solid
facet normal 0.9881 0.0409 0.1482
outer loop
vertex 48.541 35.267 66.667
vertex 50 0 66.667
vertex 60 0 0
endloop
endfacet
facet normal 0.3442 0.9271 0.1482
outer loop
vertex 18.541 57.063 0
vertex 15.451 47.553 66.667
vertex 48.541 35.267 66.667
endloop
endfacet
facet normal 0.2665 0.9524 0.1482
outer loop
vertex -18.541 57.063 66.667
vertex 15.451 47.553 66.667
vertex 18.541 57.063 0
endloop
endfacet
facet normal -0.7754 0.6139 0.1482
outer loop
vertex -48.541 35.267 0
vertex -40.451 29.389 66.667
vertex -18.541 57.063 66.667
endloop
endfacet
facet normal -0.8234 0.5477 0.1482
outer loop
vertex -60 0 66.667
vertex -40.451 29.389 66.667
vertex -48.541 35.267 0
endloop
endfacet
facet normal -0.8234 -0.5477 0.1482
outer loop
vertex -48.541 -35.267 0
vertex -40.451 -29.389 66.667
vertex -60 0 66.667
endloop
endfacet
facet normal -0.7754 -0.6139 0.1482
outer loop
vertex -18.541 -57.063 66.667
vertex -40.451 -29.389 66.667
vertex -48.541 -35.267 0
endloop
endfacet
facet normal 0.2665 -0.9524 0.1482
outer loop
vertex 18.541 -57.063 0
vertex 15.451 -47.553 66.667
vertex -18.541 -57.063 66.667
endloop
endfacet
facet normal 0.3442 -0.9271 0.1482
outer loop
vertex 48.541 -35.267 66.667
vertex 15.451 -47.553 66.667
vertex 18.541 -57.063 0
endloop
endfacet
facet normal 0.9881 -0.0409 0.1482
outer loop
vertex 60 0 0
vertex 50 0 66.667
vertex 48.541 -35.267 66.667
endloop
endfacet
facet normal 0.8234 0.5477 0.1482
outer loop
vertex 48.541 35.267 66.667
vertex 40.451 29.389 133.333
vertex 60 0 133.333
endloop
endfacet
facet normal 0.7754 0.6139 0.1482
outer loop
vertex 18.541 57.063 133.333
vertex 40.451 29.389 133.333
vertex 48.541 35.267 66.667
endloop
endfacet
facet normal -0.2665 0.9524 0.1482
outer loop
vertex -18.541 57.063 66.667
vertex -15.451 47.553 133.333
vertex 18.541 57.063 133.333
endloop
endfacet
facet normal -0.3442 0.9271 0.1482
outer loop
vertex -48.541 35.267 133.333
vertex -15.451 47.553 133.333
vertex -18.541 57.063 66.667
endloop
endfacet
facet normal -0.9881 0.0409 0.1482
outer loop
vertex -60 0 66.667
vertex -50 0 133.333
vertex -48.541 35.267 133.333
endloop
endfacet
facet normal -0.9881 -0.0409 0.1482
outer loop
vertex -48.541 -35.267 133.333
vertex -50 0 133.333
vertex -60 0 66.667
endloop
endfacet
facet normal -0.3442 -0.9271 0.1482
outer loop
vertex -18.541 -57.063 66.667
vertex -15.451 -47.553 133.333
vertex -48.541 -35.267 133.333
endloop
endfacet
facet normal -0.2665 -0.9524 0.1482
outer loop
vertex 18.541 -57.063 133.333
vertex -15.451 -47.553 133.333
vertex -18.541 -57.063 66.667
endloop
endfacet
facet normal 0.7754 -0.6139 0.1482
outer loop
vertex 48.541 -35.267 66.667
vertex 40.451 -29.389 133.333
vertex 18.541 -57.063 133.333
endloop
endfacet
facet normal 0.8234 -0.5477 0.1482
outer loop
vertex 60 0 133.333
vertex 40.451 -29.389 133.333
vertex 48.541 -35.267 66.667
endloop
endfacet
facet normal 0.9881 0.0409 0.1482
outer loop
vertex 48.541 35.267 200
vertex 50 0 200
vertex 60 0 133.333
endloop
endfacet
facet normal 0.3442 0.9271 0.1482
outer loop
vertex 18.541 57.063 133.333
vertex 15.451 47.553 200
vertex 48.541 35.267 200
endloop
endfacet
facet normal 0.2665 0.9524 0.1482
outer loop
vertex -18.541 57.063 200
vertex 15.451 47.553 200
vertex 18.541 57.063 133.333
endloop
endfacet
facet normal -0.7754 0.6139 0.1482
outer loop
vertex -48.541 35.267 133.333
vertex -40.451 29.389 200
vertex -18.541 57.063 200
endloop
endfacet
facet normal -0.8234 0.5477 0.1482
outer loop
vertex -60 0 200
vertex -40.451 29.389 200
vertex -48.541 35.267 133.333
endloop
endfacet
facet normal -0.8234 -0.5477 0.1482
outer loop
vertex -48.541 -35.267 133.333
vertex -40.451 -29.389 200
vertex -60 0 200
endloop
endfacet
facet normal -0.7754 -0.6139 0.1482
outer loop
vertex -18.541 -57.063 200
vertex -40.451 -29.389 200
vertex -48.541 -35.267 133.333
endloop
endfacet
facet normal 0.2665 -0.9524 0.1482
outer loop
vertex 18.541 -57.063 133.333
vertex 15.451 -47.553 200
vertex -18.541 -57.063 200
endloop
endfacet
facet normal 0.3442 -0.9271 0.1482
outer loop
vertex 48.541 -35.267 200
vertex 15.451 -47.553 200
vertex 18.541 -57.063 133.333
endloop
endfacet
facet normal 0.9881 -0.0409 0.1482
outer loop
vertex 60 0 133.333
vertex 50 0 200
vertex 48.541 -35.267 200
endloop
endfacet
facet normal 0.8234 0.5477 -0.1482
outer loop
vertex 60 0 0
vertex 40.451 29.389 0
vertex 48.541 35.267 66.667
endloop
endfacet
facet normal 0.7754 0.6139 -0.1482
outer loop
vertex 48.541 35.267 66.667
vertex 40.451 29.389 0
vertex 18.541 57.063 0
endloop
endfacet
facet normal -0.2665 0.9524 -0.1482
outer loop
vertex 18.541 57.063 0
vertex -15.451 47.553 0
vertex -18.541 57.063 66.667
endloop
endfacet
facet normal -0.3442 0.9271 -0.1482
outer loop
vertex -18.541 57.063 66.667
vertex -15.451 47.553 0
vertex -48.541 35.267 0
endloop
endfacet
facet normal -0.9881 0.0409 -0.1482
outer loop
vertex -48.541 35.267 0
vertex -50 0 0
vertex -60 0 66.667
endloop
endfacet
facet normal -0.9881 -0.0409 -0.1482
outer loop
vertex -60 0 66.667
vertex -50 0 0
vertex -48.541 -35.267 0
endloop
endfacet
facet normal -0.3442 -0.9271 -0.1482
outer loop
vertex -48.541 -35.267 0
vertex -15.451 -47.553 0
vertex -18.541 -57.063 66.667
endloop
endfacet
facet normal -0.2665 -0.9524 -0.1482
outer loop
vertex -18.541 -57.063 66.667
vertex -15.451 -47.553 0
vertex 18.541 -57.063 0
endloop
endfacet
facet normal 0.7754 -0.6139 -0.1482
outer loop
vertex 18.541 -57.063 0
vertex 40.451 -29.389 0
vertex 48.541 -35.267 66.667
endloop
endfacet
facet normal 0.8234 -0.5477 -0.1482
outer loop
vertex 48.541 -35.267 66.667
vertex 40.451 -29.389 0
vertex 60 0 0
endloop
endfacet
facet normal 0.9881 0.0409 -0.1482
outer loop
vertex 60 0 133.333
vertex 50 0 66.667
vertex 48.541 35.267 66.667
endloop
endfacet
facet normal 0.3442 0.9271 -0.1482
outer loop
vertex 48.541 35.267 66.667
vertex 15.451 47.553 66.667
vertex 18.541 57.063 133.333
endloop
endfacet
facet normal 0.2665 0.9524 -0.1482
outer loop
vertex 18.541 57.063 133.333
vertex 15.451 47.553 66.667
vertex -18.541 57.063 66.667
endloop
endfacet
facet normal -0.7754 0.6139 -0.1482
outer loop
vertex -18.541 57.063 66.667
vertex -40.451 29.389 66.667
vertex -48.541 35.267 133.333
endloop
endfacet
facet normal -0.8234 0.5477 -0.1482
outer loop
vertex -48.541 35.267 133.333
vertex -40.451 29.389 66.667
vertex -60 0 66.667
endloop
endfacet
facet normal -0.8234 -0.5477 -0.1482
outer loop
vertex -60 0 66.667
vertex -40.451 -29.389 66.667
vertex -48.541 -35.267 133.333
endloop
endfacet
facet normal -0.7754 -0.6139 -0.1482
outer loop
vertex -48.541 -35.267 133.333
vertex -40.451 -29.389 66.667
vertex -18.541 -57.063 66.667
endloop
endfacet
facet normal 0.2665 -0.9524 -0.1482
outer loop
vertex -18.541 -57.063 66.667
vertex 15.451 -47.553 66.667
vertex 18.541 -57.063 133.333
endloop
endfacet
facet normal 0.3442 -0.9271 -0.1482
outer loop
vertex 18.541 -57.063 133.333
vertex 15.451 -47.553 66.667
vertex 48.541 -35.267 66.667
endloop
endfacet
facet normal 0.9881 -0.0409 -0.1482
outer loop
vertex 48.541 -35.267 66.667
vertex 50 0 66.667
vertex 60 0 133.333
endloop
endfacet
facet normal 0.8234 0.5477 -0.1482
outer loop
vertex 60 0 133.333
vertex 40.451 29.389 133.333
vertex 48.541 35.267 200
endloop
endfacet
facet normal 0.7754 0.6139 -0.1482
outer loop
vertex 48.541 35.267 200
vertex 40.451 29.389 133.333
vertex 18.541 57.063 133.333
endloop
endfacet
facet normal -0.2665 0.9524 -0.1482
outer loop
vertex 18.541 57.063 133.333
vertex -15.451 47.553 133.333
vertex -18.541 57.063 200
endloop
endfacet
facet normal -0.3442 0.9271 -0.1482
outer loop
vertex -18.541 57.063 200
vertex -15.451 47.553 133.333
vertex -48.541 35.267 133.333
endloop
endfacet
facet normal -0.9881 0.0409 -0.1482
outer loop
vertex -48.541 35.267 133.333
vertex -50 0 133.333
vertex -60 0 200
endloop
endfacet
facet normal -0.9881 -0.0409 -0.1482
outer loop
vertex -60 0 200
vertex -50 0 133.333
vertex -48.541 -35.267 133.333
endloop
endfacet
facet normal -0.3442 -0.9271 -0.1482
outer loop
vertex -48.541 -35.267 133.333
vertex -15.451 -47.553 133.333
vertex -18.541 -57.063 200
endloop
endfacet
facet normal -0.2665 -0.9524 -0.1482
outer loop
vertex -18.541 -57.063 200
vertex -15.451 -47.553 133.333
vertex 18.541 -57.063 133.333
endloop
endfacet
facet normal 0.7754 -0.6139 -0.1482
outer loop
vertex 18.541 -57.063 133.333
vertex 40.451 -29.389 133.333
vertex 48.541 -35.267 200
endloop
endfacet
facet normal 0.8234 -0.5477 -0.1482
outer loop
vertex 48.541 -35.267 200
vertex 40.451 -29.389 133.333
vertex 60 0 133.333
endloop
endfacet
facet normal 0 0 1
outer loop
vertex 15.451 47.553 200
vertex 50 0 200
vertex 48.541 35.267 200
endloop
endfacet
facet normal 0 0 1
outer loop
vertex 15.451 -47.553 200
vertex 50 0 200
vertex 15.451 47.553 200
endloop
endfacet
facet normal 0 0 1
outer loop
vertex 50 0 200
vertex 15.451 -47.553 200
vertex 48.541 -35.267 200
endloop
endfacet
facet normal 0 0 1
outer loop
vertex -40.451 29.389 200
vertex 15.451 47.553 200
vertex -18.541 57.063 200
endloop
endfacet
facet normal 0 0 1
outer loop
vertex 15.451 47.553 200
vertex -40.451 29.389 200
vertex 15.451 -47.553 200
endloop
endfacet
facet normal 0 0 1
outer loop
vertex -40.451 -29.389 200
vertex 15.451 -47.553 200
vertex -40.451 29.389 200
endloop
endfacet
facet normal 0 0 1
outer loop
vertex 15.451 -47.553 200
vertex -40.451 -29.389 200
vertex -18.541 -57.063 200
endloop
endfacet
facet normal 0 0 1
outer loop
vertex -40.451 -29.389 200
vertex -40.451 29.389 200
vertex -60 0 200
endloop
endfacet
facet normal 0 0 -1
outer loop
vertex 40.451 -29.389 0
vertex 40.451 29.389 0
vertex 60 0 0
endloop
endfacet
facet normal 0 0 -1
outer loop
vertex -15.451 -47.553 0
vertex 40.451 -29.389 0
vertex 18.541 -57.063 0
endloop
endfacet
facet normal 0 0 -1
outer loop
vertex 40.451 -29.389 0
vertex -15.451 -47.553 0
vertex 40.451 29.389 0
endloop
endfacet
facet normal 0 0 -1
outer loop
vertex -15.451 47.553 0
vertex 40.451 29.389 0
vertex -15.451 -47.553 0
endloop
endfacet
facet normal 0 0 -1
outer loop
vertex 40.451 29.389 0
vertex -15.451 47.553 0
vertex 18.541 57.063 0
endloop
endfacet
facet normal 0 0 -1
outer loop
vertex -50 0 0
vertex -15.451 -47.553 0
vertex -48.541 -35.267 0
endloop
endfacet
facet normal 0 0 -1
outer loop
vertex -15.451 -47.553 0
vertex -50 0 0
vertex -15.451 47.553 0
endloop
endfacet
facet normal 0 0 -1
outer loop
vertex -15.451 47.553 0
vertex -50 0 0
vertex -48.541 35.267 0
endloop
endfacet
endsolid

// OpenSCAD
// Height
height = 200; // [10:200]

// Bottom radius
radius = 50; // [1:120]

// Top radius
radiusTop = 50; // [1:120]

// Number of Sides
sides = 10; // [3:100]

// Number of Levels
levels = 3; // [1:100]

// Spike size
spike = 10; // [0:20]

// Twist angle per layer
twist = 0; // [0:360]

function levelRadius(level) = radius + (radiusTop-radius)/levels * level;
function levelTwist(level) = level * twist;
/* function spikeRadius(level, side) = let(
  oddLayer = level % 2 == 1,
  evenPoint = side % 2 == 0
) (oddLayer && evenPoint) ? spike : 0; */
function spikeRadius(level, side) = let(
  oddLayer = level % 2 == 1,
  oddPoint = side % 2 == 1
) (oddLayer && oddPoint) ? spike : (!oddLayer && !oddPoint) ? spike : 0;

// ----------------------------------------------------------------------------
maxHeight = height - height % levels; // recalculated max height
levelHeight = floor(height / levels); // one level height
sideAngle = 360 / sides; // one side angle

points = [
  for(z = [0:levelHeight:maxHeight])
    for(i = [0:sideAngle:359])
      let(
        level = z / levelHeight,
        side = i / sideAngle,
        t = levelTwist(level),
        r = levelRadius(level) + spikeRadius(level, side),
        x = r * cos(i + t),
        y = r * sin(i + t)
      )
      [x, y, z]
];

function p(s, z) = [
  s + sides * z,
  s + sides * (z + 1),
  ((s + 1) % sides) + sides * (z + 1),
  ((s + 1) % sides) + sides * z
];

faces = concat(
  [
    for(z = [0:(maxHeight / levelHeight) - 1])
      for(s = [0:sides - 1])
        let (o = p(s, z))
        ((s + z) % 2 == 0) ? [o[0], o[1], o[2]] : [o[1], o[2], o[3]]
  ],
  [
    for(z = [0:(maxHeight / levelHeight) - 1])
      for(s = [0:sides - 1])
        let (o = p(s, z))
        ((s + z) % 2 == 0) ? [o[2], o[3], o[0]] : [o[3], o[0], o[1]]
  ],
  [[for(s = [sides - 1:-1:0]) maxHeight / levelHeight * sides + s]], // top
  [[for(s = [0:sides - 1]) s]] // bottom
);

translate([0,0,0])
  scale([1,1,height/maxHeight])
    polyhedron(points, faces);
